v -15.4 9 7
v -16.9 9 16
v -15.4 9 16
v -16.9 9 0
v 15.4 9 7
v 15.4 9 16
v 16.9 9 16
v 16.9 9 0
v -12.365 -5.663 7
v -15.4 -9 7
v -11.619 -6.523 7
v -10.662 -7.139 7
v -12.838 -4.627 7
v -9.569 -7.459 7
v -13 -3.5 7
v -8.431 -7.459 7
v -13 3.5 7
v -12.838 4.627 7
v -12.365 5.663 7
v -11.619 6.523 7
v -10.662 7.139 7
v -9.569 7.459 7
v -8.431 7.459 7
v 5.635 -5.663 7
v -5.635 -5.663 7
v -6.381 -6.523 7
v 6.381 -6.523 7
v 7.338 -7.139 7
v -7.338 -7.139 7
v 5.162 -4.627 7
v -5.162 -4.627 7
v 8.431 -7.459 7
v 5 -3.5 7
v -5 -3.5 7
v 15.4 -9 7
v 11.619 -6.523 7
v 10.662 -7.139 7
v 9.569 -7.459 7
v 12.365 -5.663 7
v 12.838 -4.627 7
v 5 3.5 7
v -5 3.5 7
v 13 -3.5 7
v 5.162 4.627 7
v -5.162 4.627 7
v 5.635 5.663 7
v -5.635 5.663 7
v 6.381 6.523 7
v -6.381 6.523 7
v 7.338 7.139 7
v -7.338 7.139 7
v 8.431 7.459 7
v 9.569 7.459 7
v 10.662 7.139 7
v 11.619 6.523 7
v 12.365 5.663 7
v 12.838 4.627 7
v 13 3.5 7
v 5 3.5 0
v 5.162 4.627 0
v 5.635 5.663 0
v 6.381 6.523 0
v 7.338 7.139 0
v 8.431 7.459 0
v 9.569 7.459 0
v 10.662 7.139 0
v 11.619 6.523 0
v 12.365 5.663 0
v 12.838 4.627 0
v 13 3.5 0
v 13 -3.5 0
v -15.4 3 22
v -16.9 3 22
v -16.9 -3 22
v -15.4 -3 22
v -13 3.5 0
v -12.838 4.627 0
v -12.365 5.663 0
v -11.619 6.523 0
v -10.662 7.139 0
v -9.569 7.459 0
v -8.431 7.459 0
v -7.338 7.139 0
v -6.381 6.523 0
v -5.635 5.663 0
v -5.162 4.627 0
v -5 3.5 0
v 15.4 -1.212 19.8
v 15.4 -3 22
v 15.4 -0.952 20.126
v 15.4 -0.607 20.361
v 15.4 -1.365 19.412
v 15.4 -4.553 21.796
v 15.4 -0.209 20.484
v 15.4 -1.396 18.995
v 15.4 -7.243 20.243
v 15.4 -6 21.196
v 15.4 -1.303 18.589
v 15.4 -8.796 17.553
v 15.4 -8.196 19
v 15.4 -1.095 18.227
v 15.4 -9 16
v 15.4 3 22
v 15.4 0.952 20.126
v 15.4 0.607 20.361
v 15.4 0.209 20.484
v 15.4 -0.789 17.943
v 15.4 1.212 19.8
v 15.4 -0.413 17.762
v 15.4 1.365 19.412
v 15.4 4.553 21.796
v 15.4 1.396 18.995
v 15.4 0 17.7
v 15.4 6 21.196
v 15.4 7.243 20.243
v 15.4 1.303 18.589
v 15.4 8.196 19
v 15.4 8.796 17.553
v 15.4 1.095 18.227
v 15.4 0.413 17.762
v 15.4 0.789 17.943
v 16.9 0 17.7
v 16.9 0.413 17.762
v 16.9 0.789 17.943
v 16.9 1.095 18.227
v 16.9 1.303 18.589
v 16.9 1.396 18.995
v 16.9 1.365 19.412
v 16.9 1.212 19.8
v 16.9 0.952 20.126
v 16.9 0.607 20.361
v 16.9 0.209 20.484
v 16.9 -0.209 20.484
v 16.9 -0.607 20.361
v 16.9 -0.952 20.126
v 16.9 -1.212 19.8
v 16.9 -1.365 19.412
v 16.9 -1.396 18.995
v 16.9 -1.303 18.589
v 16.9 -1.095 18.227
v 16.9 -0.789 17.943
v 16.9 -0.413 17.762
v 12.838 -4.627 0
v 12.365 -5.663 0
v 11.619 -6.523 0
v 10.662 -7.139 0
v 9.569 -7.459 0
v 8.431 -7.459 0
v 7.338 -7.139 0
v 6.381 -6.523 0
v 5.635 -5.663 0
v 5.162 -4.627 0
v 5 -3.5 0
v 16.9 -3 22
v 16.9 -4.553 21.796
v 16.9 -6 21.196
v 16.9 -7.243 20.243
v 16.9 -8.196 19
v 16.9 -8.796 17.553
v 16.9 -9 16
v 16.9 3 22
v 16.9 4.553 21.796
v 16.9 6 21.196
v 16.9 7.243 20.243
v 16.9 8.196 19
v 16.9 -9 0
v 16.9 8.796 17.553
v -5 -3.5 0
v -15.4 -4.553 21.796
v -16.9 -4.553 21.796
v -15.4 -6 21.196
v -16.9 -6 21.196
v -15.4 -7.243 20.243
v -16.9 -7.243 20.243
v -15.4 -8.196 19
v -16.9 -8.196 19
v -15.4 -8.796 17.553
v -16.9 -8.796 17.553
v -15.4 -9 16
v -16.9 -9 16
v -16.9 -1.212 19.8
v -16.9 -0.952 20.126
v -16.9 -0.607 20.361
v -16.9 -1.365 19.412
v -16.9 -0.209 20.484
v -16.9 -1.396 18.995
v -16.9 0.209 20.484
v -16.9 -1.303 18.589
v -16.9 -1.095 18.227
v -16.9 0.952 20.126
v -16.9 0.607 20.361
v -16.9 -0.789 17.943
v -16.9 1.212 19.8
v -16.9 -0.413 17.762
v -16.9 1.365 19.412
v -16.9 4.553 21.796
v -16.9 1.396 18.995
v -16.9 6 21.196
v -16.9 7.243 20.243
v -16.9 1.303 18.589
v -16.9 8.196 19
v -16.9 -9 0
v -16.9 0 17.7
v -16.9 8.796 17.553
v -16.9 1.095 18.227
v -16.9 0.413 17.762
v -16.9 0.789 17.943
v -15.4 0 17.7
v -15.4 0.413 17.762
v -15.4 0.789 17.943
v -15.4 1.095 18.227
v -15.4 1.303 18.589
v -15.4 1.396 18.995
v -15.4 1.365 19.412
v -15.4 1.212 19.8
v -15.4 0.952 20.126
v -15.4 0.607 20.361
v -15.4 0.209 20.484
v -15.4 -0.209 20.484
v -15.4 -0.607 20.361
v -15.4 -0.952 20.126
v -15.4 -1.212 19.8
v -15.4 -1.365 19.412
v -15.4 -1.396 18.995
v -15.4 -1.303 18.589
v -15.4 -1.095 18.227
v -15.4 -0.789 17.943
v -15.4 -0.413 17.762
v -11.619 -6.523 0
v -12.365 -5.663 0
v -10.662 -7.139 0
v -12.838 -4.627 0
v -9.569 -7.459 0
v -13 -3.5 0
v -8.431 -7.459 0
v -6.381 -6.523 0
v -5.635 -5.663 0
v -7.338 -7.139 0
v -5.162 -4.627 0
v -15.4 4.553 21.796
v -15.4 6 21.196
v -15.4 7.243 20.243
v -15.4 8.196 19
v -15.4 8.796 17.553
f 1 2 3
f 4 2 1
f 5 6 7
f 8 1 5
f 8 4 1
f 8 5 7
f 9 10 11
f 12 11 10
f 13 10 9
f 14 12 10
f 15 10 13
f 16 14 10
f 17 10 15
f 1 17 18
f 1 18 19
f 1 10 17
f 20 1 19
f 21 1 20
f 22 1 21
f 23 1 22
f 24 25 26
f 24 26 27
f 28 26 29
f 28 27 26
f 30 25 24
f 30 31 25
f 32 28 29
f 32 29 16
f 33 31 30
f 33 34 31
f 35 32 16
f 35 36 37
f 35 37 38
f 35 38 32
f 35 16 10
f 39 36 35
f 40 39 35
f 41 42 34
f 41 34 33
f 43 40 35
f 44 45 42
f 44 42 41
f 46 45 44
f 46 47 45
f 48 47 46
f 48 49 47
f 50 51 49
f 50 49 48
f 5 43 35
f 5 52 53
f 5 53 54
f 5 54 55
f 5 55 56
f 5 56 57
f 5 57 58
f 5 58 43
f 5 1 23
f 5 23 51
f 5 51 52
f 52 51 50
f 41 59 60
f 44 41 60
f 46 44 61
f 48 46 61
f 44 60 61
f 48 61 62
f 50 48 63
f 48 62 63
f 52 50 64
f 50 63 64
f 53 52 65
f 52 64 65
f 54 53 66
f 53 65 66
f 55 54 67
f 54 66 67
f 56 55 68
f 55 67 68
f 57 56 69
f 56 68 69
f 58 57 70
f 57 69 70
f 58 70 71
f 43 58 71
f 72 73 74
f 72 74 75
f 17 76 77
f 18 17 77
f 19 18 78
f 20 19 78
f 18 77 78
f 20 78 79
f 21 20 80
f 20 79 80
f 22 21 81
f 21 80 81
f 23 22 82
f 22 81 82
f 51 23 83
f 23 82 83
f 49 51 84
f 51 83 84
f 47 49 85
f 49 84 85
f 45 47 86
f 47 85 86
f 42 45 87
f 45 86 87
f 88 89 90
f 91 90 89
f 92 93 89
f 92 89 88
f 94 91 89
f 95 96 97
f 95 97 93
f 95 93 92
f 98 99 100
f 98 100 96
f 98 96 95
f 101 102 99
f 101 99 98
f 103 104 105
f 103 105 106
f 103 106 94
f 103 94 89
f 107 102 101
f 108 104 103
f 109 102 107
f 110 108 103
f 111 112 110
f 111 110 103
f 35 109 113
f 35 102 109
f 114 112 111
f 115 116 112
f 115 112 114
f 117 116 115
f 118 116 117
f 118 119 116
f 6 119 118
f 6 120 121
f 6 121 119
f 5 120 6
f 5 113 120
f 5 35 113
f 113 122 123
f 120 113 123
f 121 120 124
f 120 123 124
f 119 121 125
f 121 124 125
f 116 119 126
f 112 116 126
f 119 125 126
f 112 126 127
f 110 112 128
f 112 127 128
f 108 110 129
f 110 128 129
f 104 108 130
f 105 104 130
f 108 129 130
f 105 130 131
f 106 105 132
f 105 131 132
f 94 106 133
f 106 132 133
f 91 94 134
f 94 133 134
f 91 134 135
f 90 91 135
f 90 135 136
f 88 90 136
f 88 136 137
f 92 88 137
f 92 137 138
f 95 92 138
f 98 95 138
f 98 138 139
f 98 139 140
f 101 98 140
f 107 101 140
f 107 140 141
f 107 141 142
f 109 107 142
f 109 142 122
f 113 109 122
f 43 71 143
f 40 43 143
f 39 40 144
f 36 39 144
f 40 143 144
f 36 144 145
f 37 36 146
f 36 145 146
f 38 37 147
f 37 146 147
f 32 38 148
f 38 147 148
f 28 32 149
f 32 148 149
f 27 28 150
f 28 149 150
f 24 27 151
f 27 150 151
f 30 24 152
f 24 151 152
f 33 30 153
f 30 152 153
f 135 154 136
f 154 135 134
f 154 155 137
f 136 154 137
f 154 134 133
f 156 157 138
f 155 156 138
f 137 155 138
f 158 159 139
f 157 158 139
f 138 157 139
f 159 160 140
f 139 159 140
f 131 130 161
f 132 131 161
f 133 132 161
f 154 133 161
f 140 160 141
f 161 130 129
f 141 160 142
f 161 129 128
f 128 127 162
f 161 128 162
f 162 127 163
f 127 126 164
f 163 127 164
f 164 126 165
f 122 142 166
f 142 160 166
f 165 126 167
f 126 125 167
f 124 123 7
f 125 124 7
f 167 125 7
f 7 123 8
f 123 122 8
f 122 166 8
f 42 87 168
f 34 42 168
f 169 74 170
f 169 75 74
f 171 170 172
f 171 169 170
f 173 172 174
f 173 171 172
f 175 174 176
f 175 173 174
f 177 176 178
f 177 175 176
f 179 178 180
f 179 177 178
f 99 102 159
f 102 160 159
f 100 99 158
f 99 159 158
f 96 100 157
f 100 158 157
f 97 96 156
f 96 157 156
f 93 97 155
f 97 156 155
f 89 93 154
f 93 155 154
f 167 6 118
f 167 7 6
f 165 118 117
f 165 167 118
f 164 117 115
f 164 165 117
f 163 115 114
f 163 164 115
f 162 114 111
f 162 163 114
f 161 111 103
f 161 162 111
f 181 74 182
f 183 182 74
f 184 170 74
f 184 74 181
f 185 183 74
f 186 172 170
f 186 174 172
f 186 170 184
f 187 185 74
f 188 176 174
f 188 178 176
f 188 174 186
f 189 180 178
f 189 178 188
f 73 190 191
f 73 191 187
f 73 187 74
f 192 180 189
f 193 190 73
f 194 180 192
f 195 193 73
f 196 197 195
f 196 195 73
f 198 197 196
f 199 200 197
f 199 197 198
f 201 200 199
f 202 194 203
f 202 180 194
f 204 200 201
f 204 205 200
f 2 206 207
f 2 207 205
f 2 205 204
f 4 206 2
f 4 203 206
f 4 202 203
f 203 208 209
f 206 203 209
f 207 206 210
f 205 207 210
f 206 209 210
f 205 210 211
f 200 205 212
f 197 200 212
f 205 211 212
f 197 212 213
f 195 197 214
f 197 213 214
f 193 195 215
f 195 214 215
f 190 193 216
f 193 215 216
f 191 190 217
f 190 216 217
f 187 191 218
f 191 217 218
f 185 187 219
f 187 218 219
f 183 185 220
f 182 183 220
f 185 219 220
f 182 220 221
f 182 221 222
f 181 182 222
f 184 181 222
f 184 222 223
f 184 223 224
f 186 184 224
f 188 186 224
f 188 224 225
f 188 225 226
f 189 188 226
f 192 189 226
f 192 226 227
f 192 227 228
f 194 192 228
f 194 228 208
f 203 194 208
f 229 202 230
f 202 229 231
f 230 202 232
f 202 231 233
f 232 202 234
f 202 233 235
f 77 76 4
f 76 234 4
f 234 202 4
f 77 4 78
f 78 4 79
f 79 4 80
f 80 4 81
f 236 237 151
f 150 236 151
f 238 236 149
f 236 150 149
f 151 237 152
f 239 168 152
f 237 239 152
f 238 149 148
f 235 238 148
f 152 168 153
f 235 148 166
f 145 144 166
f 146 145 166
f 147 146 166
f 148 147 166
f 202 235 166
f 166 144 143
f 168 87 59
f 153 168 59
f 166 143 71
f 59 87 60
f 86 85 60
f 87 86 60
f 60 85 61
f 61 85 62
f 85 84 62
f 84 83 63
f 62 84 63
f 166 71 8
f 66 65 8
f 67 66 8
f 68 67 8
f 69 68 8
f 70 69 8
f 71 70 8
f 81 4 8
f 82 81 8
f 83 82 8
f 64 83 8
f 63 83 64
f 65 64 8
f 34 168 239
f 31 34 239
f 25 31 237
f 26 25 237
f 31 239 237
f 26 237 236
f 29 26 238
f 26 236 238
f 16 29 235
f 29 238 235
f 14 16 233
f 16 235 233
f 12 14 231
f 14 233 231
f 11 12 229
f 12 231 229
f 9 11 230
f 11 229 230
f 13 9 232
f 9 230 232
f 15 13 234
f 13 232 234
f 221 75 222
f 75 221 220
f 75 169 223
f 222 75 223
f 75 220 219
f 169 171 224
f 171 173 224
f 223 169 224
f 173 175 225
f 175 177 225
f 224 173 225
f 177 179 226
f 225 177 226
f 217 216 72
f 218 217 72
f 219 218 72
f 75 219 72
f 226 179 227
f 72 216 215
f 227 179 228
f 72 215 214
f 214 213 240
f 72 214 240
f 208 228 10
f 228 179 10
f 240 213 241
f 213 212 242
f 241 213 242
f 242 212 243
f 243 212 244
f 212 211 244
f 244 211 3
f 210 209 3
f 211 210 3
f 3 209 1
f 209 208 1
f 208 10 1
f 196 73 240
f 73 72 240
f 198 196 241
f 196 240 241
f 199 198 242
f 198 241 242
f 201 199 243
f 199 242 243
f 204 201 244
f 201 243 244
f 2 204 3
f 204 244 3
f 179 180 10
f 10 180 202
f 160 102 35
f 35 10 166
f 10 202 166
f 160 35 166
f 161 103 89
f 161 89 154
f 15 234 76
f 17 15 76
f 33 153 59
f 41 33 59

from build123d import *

# Parameters (mm, degrees)
SKETCH1_W           = 33.8
SKETCH1_H           = 18
BOSS_EXTRUDE1_DEPTH = 7
SKETCH2_W           = 1.5
SKETCH2_H           = 18
BOSS_EXTRUDE2_DEPTH = 15
SKETCH3_R           = 1.4
CUT_EXTRUDE1_DEPTH  = 34.8
FILLET1_R           = 6


with BuildPart() as part:
    # Sketch1 → Boss-Extrude1 (new body)
    with BuildSketch(Plane.XY):
        Rectangle(SKETCH1_W, SKETCH1_H)
        with BuildLine():
            Line((-5, 3.5), (-5, -3.5))
            ThreePointArc((-5, -3.5), (-9, -7.5), (-13, -3.5))
            Line((-13, -3.5), (-13, 3.5))
            ThreePointArc((-13, 3.5), (-9, 7.5), (-5, 3.5))
        make_face(mode=Mode.SUBTRACT)
        with BuildLine():
            Line((13, 3.5), (13, -3.5))
            ThreePointArc((13, -3.5), (9, -7.5), (5, -3.5))
            Line((5, -3.5), (5, 3.5))
            ThreePointArc((5, 3.5), (9, 7.5), (13, 3.5))
        make_face(mode=Mode.SUBTRACT)
    extrude(amount=BOSS_EXTRUDE1_DEPTH)

    # Sketch2 → Boss-Extrude2 (add)
    with BuildSketch(Plane.XY.offset(7)):
        with Locations((-16.15, 0)):
            Rectangle(SKETCH2_W, SKETCH2_H)
        with Locations((16.15, 0)):
            Rectangle(SKETCH2_W, SKETCH2_H)
    extrude(amount=BOSS_EXTRUDE2_DEPTH)

    # Sketch3 → Cut-Extrude1 (cut, through all)
    with BuildSketch(Plane(origin=(16.9, 0, 0), x_dir=(0, 0, -1), z_dir=(1, 0, 0))):
        with Locations((-19.1, 0)):
            Circle(SKETCH3_R)
    extrude(amount=-CUT_EXTRUDE1_DEPTH, mode=Mode.SUBTRACT)

    # Fillet1
    fillet1_edges = [part.edges().sort_by_distance(p)[0] for p in [
        (16.15, -9, 22),
        (-16.15, -9, 22),
        (-16.15, 9, 22),
        (16.15, 9, 22),
    ]]
    fillet(fillet1_edges, radius=FILLET1_R)


solid = part.part
